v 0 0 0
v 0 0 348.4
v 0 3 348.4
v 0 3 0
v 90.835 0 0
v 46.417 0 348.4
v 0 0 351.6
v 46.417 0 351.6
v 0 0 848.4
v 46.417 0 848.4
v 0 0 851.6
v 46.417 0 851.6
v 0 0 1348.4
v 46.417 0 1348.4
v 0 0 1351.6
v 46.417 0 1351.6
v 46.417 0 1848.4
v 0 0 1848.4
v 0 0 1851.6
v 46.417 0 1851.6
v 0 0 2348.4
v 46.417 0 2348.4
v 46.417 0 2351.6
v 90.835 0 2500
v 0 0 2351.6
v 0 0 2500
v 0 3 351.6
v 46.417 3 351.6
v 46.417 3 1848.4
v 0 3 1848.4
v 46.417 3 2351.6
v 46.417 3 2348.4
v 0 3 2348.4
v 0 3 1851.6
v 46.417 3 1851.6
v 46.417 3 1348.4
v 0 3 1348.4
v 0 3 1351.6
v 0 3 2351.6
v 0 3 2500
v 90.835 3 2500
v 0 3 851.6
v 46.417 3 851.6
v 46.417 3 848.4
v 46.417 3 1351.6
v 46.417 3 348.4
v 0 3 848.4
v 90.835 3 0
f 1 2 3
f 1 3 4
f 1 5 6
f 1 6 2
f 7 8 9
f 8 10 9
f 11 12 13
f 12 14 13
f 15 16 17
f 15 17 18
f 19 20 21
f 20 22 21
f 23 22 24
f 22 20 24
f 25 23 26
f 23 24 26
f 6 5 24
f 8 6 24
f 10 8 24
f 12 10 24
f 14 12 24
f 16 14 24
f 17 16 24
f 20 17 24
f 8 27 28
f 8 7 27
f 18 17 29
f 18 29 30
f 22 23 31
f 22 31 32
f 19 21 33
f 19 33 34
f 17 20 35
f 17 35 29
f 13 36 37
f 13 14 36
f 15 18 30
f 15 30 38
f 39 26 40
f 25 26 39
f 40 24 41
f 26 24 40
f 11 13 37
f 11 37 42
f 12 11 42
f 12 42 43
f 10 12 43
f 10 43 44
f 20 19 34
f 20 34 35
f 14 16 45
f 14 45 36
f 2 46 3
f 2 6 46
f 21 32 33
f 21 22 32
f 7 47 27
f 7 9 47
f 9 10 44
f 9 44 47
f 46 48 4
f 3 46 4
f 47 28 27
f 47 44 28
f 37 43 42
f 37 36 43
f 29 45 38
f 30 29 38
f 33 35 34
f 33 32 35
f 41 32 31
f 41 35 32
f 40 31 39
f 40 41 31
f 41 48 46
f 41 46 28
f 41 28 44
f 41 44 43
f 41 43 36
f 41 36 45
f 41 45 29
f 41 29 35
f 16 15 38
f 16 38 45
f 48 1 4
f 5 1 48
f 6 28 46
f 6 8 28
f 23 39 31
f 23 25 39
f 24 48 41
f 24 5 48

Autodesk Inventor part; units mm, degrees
ref_plane "YZ Plane" through (0, 0, 0) normal (1, 0, 0) x (0, 1, 0)
ref_plane "XZ Plane" through (0, 0, 0) normal (0, 1, 0) x (-1, 0, 0)
ref_plane "XY Plane" through (0, 0, 0) normal (0, 0, 1) x (1, 0, 0)
sketch "Sketch6" plane through (0, 0, 0) normal (0, 1, 0) x (-1, 0, 0)
  line L0 (0, 0) -> (-90.8346, 0)
  line L1 (-90.8346, 0) -> (-90.8346, 2500)
  line L2 (-90.8346, 2500) -> (0, 2500)
  line L3 (0, 2500) -> (0, 0)
  dimension "d26" = 90.8346
  dimension "d27" = 2500
extrude "Plate4" add sketch "Sketch6" along normal blind 3
sketch "Sketch7" plane through (0, 0, 0) normal (0, -1, 0) x (1, 0, 0)
  line L0 (0, 2500) -> (90.8346, 2500) projected
  line L1 (0, 0) -> (0, 2500) projected
  line L2 (90.8346, 0) -> (0, 0) projected
  line L3 (90.8346, 2500) -> (90.8346, 0) projected
  line L4 (0, 351.6) -> (46.4173, 351.6)
  line L5 (46.4173, 351.6) -> (46.4173, 348.4)
  line L6 (46.4173, 348.4) -> (0, 348.4)
  line L7 (0, 348.4) -> (0, 351.6)
  point P0 (0, 348.4)
  point P1 (0, 200)
  point P2 (46.4173, 200)
  point P3 (0, 348.4)
  dimension "d29" = 46.4173
  dimension "d30" = 3.2
  dimension "d31" = 348.4
extrude "Extrusion2" cut sketch "Sketch7" against normal through all contours L4 L5 L6 L1
pattern_linear "Rectangular Pattern1" count 5 spacing 500 along (0, 0, 1) of "Extrusion2"
equation "\"d26\" = Stringer1_deep"
equation "\"d28\" = Thickness"
equation "\"BendReliefWidth\" = Thickness"
equation "\"BendReliefDepth\" = 0.5 * Thickness"
equation "\"CornerReliefSize\" = 4 * Thickness"
equation "\"MinimumRemnant\" = 2 * Thickness"
equation "\"TransitionRadius\" = BendRadius"
equation "\"JacobiRadiusSize\" = BendRadius"
equation "\"GapSize\" = Thickness"
equation "\"Stringer1_deep\" = 90.834574"
equation "\"Thickness\" = 3"
equation "\"BendRadius\" = 5"
properties part number "BSH 033 stringer board 1" material "09g2s"
